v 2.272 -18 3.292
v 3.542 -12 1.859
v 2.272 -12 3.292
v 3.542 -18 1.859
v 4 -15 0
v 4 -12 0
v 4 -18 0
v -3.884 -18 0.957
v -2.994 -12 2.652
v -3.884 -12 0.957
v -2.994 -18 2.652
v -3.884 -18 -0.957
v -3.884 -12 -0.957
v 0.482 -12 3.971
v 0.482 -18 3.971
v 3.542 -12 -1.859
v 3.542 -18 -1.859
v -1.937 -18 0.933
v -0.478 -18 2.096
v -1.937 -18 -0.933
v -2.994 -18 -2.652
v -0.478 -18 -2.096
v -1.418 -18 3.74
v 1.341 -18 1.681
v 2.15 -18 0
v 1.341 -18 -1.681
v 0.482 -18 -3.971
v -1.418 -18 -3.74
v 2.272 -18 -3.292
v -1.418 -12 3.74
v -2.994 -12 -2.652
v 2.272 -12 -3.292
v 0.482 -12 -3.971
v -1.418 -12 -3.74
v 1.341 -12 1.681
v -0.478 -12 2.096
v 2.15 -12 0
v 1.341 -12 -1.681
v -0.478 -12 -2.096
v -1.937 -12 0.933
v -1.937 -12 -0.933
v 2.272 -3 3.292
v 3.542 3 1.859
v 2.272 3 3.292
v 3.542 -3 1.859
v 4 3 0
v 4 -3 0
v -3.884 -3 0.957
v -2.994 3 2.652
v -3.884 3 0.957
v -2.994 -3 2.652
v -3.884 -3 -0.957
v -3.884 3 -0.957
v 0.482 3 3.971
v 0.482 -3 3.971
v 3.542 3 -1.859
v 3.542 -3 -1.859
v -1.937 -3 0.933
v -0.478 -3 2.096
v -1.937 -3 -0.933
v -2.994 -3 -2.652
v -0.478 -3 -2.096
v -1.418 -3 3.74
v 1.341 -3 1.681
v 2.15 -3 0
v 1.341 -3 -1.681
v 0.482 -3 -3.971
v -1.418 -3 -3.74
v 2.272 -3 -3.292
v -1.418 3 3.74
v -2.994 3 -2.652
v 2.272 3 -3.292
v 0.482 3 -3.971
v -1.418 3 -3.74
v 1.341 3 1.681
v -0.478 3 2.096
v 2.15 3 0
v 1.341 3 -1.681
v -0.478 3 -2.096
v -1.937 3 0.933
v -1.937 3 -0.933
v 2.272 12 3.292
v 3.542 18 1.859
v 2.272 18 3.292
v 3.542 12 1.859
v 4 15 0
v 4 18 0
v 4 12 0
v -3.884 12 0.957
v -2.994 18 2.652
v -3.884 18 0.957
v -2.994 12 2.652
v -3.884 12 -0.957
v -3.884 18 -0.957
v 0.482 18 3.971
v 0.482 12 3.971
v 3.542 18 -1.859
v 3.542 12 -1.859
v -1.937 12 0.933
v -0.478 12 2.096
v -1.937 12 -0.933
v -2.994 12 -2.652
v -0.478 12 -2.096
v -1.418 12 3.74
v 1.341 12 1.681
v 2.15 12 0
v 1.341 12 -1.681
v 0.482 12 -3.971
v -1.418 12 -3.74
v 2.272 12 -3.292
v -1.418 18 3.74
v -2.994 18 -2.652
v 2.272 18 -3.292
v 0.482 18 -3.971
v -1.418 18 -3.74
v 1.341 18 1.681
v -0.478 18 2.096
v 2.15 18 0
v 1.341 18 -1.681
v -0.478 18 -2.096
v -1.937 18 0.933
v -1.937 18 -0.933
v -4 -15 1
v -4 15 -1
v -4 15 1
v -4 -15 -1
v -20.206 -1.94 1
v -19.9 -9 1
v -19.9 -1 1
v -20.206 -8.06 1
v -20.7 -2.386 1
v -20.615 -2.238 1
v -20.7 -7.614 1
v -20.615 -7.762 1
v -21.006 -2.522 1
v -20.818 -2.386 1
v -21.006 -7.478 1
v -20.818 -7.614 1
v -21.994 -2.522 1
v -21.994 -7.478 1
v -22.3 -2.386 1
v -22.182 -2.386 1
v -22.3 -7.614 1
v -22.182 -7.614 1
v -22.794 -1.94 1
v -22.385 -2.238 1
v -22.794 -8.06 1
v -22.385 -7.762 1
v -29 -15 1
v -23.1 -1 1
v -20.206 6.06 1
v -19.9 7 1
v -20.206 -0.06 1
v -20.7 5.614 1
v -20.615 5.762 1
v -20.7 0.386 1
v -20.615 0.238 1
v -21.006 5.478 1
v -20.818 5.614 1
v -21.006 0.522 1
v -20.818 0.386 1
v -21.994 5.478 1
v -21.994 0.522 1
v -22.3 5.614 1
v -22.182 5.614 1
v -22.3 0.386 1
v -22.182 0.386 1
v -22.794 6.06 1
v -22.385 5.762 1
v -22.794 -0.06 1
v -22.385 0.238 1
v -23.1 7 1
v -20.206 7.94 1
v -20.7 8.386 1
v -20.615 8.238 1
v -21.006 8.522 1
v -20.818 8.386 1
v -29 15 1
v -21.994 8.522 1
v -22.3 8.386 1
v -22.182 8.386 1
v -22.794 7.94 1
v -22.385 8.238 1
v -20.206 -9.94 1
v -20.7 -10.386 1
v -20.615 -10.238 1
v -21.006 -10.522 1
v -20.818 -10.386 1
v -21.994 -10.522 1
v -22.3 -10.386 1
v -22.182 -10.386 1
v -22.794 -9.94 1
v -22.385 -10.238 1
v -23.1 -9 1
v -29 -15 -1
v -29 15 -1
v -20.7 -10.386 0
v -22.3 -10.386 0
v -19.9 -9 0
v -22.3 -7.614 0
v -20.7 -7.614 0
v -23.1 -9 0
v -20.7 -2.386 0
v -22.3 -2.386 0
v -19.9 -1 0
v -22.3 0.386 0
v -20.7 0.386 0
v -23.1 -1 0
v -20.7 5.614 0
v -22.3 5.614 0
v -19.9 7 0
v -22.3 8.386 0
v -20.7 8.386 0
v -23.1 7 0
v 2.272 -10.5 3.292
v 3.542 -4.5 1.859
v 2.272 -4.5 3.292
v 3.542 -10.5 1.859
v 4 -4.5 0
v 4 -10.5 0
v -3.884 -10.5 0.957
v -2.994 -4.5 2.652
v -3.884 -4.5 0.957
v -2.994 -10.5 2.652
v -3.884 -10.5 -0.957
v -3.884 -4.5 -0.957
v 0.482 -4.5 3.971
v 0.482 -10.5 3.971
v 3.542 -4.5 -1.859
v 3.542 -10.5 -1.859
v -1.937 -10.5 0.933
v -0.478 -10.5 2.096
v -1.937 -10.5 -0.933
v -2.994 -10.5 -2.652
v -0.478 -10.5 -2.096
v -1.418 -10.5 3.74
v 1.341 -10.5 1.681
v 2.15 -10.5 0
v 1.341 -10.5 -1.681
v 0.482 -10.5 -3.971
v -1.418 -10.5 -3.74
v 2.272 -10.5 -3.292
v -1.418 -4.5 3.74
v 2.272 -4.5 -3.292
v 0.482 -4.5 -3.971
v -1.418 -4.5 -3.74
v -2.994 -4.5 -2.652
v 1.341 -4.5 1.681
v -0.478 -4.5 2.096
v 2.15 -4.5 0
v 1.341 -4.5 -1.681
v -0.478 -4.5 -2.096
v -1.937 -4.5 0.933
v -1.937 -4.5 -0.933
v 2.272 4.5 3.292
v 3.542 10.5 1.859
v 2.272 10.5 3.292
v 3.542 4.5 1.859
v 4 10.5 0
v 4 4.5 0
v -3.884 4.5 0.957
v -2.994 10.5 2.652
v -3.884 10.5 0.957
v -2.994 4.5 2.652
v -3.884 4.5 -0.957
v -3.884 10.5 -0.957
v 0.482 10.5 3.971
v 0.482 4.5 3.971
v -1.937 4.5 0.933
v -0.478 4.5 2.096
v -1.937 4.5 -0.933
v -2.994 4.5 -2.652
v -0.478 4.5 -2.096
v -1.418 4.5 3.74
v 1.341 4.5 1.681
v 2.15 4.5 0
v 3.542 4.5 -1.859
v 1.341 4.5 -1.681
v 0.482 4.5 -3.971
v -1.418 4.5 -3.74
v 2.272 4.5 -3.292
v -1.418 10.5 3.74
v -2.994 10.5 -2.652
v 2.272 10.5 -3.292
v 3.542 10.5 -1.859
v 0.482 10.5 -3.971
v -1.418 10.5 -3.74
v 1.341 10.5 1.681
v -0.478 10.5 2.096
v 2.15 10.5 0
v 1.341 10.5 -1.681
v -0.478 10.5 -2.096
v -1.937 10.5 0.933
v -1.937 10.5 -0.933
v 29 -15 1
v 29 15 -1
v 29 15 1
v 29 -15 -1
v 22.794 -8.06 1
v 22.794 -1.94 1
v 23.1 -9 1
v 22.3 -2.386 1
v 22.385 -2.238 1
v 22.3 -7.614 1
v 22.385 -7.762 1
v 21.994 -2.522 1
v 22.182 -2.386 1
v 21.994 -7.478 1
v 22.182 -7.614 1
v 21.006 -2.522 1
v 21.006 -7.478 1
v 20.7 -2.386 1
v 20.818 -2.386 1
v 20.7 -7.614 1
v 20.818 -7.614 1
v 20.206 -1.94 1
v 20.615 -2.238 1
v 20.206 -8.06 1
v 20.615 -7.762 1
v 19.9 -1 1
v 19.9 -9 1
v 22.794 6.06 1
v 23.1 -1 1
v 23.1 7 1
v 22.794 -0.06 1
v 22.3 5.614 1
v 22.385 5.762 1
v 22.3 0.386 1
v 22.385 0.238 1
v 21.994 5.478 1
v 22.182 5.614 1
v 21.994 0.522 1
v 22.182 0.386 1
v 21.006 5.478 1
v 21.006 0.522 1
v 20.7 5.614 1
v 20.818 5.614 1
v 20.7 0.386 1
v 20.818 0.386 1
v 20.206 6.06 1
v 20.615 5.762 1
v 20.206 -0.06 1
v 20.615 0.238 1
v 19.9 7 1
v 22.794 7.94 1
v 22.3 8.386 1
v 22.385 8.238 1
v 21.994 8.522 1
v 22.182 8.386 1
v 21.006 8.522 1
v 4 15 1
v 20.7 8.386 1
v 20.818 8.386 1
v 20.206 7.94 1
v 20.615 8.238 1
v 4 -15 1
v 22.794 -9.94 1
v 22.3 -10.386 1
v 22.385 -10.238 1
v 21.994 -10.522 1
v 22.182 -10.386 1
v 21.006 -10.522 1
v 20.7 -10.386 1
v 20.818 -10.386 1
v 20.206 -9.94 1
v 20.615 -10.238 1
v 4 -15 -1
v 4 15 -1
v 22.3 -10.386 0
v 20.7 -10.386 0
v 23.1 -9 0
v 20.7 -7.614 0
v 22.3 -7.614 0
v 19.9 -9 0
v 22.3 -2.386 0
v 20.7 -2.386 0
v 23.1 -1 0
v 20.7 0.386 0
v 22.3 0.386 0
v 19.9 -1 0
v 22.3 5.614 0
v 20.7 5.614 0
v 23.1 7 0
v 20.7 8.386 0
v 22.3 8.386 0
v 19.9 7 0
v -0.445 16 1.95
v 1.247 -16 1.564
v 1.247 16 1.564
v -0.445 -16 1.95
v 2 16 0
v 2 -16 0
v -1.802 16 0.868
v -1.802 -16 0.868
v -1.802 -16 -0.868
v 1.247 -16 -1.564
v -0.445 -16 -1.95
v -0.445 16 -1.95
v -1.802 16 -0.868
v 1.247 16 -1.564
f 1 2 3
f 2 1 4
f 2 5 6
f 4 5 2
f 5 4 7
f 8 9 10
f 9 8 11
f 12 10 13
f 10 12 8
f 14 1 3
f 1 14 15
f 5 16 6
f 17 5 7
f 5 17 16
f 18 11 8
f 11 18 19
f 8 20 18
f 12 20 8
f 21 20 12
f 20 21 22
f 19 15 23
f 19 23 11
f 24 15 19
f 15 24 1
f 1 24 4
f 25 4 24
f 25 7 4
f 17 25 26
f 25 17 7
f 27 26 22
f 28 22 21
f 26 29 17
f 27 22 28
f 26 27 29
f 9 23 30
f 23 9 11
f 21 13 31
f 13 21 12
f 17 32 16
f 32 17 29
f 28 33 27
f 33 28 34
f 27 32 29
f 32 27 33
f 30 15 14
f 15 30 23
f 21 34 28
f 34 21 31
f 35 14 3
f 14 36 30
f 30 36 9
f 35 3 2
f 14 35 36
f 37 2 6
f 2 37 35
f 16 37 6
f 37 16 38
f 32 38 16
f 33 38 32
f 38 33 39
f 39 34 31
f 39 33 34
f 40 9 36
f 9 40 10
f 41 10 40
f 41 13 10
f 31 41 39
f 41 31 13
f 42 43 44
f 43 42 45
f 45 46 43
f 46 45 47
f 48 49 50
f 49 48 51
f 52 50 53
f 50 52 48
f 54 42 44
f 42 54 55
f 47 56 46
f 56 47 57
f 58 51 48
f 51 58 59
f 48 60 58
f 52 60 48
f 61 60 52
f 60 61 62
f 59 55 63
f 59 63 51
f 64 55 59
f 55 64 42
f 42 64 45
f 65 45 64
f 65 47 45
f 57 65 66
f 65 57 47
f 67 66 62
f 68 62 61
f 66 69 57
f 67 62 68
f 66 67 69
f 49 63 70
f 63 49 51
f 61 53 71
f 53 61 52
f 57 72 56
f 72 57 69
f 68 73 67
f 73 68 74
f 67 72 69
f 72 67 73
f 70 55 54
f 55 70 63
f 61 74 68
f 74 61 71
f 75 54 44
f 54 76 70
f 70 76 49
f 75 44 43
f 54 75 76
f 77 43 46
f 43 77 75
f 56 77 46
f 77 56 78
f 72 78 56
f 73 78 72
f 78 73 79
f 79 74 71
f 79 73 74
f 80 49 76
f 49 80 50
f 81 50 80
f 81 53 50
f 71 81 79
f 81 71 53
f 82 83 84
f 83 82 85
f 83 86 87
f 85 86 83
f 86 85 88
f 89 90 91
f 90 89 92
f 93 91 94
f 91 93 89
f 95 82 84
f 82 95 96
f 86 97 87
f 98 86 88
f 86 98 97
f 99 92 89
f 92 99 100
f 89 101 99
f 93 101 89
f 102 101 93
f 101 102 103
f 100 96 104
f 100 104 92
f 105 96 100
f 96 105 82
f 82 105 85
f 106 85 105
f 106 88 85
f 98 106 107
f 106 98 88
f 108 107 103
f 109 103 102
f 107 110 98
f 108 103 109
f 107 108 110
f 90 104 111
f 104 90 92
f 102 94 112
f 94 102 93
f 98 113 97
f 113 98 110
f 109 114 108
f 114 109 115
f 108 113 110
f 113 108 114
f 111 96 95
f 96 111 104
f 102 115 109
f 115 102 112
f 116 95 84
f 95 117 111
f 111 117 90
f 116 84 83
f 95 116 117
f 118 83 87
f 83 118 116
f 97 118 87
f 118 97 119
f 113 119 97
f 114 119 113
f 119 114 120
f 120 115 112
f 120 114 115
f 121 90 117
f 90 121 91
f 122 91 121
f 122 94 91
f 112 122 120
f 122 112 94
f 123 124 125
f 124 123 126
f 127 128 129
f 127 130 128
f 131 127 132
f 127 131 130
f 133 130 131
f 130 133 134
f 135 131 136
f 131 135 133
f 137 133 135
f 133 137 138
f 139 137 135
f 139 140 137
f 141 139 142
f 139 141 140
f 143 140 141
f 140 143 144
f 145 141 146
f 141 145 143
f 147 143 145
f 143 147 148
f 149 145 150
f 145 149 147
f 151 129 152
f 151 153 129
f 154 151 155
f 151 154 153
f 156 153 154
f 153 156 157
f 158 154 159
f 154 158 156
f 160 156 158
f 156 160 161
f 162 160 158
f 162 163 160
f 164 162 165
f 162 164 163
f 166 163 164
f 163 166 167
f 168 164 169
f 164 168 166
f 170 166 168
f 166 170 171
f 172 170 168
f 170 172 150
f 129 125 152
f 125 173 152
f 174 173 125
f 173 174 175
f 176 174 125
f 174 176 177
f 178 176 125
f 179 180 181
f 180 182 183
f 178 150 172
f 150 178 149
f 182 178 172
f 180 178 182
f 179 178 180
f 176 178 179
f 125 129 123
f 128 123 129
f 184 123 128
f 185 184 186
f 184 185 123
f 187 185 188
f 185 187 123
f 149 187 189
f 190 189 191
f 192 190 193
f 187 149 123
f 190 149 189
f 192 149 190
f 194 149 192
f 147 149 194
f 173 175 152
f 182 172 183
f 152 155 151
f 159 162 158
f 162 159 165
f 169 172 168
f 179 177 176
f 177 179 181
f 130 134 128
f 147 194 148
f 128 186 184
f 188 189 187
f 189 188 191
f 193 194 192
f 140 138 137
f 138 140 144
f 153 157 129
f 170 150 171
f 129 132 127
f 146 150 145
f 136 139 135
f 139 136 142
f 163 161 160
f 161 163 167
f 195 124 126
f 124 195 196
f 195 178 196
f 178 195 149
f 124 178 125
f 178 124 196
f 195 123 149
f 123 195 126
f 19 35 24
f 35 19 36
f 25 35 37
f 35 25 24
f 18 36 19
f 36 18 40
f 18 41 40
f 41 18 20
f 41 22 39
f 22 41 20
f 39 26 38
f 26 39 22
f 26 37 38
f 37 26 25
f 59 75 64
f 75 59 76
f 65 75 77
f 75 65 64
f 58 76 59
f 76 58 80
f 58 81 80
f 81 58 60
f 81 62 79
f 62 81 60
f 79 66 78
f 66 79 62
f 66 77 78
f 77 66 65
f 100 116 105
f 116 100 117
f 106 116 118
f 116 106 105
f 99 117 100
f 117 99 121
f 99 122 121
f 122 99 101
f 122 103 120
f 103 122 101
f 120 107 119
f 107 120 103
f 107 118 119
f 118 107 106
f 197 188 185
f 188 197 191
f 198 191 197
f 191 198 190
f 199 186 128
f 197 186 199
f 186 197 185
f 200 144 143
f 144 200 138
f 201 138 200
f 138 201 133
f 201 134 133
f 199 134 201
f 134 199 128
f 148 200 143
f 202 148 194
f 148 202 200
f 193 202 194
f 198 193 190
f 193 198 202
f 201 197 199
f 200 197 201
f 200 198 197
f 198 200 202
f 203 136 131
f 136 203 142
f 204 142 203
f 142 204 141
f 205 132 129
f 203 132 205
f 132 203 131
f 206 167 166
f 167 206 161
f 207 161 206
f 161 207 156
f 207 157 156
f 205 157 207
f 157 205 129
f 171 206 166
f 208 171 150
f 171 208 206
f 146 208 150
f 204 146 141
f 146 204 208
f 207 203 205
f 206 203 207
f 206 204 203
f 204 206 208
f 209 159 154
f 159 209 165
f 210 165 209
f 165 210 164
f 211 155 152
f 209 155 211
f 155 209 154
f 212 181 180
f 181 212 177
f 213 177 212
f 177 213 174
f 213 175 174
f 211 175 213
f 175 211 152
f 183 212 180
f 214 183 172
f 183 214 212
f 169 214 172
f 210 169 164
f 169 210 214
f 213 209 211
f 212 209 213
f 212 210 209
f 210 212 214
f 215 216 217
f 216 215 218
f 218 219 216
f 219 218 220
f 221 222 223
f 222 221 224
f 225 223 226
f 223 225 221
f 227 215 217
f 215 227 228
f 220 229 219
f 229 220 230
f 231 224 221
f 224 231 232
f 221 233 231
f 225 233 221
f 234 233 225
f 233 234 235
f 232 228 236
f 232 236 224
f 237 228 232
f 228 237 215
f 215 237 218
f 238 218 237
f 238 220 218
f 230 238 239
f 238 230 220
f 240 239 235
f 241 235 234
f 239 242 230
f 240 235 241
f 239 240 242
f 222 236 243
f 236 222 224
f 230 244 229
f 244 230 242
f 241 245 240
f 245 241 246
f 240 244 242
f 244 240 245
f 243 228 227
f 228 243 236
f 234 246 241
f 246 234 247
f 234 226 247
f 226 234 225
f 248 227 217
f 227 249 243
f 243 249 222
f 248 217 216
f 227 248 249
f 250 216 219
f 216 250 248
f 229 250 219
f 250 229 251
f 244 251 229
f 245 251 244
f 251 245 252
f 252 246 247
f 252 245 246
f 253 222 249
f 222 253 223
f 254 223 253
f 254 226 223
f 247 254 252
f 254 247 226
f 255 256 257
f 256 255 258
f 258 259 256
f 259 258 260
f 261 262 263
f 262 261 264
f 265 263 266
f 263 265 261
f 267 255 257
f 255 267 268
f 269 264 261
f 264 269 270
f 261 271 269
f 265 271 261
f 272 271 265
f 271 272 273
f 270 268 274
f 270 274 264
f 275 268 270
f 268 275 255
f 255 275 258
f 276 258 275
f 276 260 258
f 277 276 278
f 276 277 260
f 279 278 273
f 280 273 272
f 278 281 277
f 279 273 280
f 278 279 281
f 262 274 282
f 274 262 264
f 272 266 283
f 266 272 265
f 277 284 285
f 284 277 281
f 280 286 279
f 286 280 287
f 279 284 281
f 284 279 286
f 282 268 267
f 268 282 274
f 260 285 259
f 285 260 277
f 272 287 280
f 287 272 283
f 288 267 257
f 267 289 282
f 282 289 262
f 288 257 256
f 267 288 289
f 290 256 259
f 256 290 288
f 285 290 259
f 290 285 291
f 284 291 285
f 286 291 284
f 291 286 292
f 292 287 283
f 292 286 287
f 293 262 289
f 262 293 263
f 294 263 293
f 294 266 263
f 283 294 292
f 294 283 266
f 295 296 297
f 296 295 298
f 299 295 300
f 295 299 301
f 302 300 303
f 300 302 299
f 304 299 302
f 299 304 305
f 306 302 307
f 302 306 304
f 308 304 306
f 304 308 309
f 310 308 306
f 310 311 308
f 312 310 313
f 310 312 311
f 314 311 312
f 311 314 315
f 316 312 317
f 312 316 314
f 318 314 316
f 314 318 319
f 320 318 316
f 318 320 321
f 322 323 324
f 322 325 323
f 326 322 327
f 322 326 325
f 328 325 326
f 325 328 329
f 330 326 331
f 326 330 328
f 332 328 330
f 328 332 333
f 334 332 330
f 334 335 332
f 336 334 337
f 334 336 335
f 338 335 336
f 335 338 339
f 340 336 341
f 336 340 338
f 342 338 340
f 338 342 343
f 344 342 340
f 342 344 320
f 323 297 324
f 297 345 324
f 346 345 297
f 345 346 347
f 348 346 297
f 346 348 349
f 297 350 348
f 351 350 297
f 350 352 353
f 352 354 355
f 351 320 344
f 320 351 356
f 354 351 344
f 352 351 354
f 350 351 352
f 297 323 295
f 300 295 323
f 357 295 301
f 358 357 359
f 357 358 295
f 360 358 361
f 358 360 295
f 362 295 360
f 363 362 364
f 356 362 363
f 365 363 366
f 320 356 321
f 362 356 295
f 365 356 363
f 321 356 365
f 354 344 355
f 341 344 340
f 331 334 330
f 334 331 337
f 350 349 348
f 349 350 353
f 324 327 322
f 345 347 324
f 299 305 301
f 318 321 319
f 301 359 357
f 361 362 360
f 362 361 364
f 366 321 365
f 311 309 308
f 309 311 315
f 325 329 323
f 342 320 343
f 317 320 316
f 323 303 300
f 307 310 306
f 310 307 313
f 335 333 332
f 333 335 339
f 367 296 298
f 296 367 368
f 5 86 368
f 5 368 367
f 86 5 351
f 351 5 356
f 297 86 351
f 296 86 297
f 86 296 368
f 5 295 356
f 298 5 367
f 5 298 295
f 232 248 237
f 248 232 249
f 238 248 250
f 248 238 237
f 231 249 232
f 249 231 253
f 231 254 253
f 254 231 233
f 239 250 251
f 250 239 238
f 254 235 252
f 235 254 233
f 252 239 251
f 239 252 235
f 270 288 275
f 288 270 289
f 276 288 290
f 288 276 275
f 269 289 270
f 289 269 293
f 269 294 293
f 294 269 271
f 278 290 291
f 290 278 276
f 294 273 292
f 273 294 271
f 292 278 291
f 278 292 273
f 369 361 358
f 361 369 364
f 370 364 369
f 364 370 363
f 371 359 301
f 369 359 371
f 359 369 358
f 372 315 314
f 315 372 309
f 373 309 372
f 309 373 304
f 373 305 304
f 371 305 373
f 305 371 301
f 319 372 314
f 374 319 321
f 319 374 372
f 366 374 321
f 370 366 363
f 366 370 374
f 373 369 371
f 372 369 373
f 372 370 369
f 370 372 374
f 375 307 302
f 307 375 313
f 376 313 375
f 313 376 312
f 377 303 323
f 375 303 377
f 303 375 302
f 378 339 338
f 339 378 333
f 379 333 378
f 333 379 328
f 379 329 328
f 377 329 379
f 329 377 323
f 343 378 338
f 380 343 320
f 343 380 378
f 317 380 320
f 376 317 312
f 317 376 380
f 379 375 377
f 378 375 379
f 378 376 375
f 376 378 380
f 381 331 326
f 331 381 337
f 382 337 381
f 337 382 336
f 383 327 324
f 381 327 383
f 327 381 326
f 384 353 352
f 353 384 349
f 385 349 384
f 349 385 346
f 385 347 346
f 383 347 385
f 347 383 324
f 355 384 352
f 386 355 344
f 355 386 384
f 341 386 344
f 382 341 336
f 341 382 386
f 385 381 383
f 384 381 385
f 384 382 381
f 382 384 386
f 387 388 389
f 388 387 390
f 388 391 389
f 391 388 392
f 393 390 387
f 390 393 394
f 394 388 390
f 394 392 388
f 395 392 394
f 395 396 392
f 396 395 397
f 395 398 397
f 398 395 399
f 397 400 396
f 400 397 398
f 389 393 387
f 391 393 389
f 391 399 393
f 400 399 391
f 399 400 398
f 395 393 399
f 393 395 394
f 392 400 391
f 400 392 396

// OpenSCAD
// バット蝶番（180°開いた状態）

// パラメータ
leaf_width = 25;    // 板の幅
leaf_height = 30;   // 板の高さ
leaf_thickness = 2; // 板の厚み
knuckle_od = 8;     // knuckle外径
pin_diameter = 4;   // ピン軸径
pin_clearance = 0.3; // ピンクリアランス
knuckle_id = pin_diameter + pin_clearance; // knuckle内径
pin_length = 32;    // ピン軸長さ
knuckle_length = 6; // 各knuckle長さ

// 皿穴パラメータ
screw_hole_dia = 3.2;
countersink_dia = 6;
countersink_depth = 1;
screw_spacing = 8;

module leaf_with_knuckles(knuckle_positions, side) {
    difference() {
        union() {
            // メイン板（180°開いた状態で同一平面）
            translate([side * (leaf_width/2 + knuckle_od/2), 0, 0])
                cube([leaf_width, leaf_height, leaf_thickness], center=true);
            
            // knuckles（Y軸方向に配置、互い違い）
            for (i = [0:len(knuckle_positions)-1]) {
                pos = knuckle_positions[i];
                translate([0, pos, 0])
                    rotate([90, 0, 0])
                    cylinder(h=knuckle_length, d=knuckle_od, center=true);
            }
        }
        
        // knuckle穴（ピン軸用、Y軸方向）
        for (i = [0:len(knuckle_positions)-1]) {
            pos = knuckle_positions[i];
            translate([0, pos, 0])
                rotate([90, 0, 0])
                cylinder(h=knuckle_length+0.2, d=knuckle_id, center=true);
        }
        
        // 皿穴（knuckleから離れた側）
        for (i = [0:2]) {
            screw_y = -leaf_height/2 + 6 + i * screw_spacing;
            translate([side * (leaf_width * 0.7 + knuckle_od/2), screw_y, leaf_thickness/2]) {
                // 皿穴（表面側）
                cylinder(h=countersink_depth+0.1, d1=screw_hole_dia, d2=countersink_dia);
                // 貫通穴
                translate([0, 0, -leaf_thickness/2])
                    cylinder(h=leaf_thickness+0.2, d=screw_hole_dia);
            }
        }
    }
}

// knuckle位置（Y座標、30mmを5等分して中心配置）
// 左板（外側2個＋中央1個）: -15, -9, -3, 3, 9, 15のうち-15, 0, 15
left_knuckle_positions = [-15, 0, 15];

// 右板（中間2個）: -7.5, 7.5
right_knuckle_positions = [-7.5, 7.5];

// 左板（x<0側）
color("steelblue")
leaf_with_knuckles(left_knuckle_positions, -1);

// 右板（x>0側）
color("steelblue") 
leaf_with_knuckles(right_knuckle_positions, 1);

// ピン軸（Y軸方向、32mm長さ）
color("silver")
rotate([90, 0, 0])
cylinder(h=pin_length, d=pin_diameter, center=true);
